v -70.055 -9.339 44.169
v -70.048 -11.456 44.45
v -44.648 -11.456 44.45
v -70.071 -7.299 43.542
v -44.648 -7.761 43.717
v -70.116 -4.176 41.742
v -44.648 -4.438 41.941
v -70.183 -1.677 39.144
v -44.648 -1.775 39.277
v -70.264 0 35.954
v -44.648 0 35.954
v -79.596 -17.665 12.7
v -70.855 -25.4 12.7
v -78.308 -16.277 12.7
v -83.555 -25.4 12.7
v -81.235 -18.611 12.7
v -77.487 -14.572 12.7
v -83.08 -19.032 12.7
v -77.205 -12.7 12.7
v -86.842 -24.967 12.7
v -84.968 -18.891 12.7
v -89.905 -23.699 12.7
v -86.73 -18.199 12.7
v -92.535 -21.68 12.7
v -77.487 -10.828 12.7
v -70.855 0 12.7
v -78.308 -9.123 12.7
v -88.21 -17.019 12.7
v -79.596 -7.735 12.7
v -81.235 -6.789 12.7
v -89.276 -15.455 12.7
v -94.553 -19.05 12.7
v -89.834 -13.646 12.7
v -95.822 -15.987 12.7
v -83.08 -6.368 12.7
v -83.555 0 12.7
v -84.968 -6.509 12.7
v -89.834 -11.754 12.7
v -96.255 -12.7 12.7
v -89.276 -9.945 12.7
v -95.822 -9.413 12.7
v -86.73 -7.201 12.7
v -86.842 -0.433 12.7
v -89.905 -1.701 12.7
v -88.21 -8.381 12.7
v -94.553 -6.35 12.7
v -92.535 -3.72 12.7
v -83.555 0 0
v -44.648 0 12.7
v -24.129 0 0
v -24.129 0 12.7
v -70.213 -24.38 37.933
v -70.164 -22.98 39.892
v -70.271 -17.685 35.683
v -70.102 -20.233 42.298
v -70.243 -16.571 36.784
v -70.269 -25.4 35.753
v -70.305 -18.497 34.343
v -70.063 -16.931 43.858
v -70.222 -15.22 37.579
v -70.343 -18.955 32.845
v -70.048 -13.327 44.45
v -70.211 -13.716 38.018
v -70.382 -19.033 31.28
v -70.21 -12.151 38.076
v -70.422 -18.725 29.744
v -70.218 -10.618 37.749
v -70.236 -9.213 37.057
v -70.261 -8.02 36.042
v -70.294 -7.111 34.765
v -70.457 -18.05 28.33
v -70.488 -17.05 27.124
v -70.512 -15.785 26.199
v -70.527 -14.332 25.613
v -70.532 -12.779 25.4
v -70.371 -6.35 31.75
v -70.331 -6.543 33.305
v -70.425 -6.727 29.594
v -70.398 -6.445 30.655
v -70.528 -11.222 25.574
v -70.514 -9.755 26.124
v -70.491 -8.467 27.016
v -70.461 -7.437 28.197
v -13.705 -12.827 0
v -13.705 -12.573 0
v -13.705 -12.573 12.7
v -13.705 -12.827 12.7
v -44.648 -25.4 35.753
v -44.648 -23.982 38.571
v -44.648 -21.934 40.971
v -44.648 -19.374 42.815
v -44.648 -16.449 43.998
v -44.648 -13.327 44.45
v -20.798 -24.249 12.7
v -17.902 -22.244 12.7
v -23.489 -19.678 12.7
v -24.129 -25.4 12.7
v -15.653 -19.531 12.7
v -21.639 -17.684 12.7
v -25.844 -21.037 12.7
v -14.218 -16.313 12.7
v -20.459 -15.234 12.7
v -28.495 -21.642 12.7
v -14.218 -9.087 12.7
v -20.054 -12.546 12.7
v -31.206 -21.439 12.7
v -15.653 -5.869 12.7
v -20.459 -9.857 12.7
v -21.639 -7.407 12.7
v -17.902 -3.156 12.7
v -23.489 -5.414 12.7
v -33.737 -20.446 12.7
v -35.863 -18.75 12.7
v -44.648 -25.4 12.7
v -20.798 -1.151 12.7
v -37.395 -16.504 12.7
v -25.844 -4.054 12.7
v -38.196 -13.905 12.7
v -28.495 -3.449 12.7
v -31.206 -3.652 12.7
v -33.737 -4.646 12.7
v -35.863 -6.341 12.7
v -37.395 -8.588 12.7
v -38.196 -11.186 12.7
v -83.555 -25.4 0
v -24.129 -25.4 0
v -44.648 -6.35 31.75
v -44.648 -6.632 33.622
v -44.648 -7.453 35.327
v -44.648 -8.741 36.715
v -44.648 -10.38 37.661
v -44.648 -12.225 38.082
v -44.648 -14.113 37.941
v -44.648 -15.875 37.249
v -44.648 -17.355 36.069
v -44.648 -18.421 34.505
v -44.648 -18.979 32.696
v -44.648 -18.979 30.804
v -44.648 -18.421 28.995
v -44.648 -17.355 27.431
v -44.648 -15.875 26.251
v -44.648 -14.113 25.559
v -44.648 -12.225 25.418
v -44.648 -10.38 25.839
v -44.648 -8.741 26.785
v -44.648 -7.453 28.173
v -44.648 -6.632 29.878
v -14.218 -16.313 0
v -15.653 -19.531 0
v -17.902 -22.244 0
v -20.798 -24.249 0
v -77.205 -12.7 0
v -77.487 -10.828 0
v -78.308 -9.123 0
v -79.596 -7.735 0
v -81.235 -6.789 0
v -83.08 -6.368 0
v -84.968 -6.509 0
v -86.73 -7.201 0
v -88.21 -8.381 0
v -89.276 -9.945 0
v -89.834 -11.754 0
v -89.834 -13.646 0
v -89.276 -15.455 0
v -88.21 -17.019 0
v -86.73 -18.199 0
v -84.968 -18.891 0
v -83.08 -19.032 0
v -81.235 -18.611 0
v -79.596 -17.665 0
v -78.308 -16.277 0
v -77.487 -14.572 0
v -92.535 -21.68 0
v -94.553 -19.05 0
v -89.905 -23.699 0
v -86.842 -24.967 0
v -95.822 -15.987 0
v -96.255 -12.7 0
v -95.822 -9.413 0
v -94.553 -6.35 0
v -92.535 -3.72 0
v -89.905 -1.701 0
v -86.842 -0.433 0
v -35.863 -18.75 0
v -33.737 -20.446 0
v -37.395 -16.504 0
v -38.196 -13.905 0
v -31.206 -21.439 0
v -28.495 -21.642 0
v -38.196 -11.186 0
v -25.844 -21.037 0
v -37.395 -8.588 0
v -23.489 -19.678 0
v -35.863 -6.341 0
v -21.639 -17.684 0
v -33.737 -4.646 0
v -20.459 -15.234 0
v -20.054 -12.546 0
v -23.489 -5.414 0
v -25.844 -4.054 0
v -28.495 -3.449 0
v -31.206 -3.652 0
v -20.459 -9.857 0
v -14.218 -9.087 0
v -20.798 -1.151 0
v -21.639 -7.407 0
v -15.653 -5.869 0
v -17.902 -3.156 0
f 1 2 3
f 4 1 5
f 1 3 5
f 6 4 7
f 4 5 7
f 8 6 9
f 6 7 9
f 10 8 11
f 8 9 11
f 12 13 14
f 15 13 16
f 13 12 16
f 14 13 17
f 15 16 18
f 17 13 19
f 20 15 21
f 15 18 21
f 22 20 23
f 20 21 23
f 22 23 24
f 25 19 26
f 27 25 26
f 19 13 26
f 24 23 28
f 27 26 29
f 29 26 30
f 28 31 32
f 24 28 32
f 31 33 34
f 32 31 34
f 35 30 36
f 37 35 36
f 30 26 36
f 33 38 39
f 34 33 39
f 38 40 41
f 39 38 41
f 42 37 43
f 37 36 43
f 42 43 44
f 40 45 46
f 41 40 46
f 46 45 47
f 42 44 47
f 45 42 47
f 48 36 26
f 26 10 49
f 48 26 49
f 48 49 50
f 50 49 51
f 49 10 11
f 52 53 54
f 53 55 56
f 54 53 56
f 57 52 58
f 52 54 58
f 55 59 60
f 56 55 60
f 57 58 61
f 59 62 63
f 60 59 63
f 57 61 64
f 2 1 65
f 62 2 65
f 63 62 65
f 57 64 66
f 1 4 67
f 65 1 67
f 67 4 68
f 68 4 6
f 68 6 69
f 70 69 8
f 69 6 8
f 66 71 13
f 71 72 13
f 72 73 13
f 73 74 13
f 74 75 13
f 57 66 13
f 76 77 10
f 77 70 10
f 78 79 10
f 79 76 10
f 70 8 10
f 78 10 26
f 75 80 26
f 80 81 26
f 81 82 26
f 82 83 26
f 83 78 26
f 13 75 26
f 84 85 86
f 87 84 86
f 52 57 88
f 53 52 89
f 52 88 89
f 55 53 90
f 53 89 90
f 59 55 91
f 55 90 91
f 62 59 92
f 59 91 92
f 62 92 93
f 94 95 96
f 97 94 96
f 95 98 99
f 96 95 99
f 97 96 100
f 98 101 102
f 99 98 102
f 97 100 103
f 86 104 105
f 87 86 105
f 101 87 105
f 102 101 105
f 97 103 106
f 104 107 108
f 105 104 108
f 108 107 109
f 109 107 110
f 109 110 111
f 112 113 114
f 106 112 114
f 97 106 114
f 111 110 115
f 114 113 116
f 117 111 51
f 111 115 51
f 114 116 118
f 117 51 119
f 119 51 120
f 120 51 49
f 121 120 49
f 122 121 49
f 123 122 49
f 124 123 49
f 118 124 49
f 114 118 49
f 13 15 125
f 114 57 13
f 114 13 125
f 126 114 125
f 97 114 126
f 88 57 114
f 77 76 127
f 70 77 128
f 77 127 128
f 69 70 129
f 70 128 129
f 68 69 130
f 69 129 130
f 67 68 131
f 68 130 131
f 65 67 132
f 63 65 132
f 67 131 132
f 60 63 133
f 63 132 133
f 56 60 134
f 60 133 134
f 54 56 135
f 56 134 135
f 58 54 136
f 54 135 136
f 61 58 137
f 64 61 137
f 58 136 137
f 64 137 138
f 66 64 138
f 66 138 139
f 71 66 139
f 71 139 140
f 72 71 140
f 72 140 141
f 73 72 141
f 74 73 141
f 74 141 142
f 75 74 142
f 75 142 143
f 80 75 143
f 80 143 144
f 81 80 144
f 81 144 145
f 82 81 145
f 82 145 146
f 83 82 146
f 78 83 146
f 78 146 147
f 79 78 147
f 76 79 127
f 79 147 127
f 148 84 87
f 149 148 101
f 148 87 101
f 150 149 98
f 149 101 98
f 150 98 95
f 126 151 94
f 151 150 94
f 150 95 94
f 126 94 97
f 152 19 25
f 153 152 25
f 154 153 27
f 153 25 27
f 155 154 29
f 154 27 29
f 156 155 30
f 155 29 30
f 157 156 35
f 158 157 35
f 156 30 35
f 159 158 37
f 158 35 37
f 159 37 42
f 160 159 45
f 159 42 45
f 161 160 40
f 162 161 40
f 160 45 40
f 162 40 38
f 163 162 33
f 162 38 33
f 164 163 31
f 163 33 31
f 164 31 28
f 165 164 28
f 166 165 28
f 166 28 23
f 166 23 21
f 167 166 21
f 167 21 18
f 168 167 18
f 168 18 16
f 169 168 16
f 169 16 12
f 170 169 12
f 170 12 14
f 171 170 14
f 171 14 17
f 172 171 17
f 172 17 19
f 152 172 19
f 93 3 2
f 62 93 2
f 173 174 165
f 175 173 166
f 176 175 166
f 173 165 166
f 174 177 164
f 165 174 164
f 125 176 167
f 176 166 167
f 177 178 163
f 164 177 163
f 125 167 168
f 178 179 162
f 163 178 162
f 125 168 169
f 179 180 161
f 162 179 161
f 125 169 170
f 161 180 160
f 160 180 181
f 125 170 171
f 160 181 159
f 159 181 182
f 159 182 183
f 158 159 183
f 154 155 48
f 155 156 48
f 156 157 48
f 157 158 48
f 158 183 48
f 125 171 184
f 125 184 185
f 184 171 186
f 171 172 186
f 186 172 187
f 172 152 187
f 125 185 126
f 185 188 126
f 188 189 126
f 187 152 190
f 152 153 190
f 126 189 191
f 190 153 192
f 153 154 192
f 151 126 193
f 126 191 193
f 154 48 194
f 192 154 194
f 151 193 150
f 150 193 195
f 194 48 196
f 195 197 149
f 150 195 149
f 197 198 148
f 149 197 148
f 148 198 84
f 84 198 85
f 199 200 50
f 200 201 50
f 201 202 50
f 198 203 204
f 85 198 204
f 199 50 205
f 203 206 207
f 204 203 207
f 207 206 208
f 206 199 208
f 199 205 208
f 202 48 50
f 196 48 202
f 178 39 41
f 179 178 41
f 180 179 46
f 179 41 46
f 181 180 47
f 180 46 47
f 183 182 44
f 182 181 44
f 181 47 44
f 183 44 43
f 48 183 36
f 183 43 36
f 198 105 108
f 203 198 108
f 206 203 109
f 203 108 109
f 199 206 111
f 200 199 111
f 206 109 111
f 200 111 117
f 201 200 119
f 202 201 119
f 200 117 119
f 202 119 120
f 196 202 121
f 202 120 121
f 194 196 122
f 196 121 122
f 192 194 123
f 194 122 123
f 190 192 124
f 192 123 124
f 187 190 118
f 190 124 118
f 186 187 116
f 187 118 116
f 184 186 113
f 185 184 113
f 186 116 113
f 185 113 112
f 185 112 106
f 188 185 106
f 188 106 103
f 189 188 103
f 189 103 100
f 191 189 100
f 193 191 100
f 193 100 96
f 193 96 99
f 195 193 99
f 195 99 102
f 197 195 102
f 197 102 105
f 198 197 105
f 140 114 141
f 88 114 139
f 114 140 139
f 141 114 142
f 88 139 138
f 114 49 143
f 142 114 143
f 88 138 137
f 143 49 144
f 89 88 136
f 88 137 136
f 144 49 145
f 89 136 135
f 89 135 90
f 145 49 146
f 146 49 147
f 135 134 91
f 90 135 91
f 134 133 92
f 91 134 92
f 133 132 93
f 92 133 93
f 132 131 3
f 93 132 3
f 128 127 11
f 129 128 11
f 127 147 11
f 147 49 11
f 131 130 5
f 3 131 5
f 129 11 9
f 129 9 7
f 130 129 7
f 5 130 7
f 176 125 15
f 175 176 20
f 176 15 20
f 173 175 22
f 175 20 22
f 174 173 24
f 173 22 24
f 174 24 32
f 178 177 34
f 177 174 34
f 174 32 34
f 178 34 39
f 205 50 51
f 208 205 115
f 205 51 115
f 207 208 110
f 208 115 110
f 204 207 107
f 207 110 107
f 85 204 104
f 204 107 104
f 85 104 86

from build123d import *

# Parameters (mm, degrees)
F1_DEPTH  = 25.4
F2_R      = 6.35
F3_DEPTH  = 51.60825547
F5_DEPTH  = 51.60825547
F6_R      = 9.122141835
F7_DEPTH  = 12.701
F8_R      = 6.35
F9_DEPTH  = 12.701
F11_DEPTH = 12.701
F13_DEPTH = 12.701


with BuildPart() as f1:
    # F0 (on Front) → F1 (new body)
    with BuildSketch(Plane.XZ):
        Polygon((-70.854865197, 12.7), (-96.254865197, 12.7), (-96.254865197, 0), (-13.704865197, 0), (-13.704865197, 12.7), (-44.647609727, 12.7), (-44.647609727, 44.45), (-70.047609727, 44.45), align=None)
    extrude(amount=F1_DEPTH)

    # F2 (on face) → F3 (cut, through all)
    with BuildSketch(Plane.YZ.offset(-44.647609727)):
        with Locations((-12.7, 31.75)):
            Circle(F2_R)
    extrude(amount=-F3_DEPTH, mode=Mode.SUBTRACT)

    # F4 (on face) → F5 (cut, through all)
    with BuildSketch(Plane.YZ.offset(-44.647609727)):
        with BuildLine():
            ThreePointArc((-25.4, 35.7528030872), (-20.7098485948, 41.9702258596), (-13.3271264447, 44.45))
            Line((-13.3271264447, 44.45), (-25.4, 44.45))
            Line((-25.4, 44.45), (-25.4, 35.7528030872))
        make_face()
        with BuildLine():
            Line((0, 44.45), (-11.4556124951, 44.45))
            ThreePointArc((-11.4556124951, 44.45), (-4.4379972961, 41.9413380989), (0, 35.9543114901))
            Line((0, 35.9543114901), (0, 44.45))
        make_face()
    extrude(amount=-F5_DEPTH, mode=Mode.SUBTRACT)

    # F6 (on face) → F7 (cut, through all)
    with BuildSketch(Plane.XY.offset(12.7)):
        with Locations((-29.176237462, -12.5456847349)):
            Circle(F6_R)
    extrude(amount=-F7_DEPTH, mode=Mode.SUBTRACT)

    # F8 (on face) → F9 (cut, through all)
    with BuildSketch(Plane.XY.offset(12.7)):
        with Locations((-83.554865197, -12.7)):
            Circle(F8_R)
    extrude(amount=-F9_DEPTH, mode=Mode.SUBTRACT)

    # F10 (on face) → F11 (cut, through all)
    with BuildSketch(Plane.XY.offset(12.7)):
        with BuildLine():
            ThreePointArc((-96.254865197, -12.7), (-92.5351213181, -3.7197438789), (-83.554865197, 0))
            Line((-83.554865197, 0), (-96.254865197, 0))
            Line((-96.254865197, 0), (-96.254865197, -12.7))
        make_face()
        with BuildLine():
            ThreePointArc((-83.554865197, -25.4), (-92.5351213181, -21.6802561211), (-96.254865197, -12.7))
            Line((-96.254865197, -12.7), (-96.254865197, -25.4))
            Line((-96.254865197, -25.4), (-83.554865197, -25.4))
        make_face()
    extrude(amount=-F11_DEPTH, mode=Mode.SUBTRACT)

    # F12 (on face) → F13 (cut, through all)
    with BuildSketch(Plane.XY.offset(12.7)):
        with BuildLine():
            ThreePointArc((-24.1288895467, 0), (-16.6844564555, -4.4358743894), (-13.704865197, -12.5733556693))
            Line((-13.704865197, -12.5733556693), (-13.704865197, 0))
            Line((-13.704865197, 0), (-24.1288895467, 0))
        make_face()
        with BuildLine():
            ThreePointArc((-13.704865197, -12.8266443307), (-16.6844564555, -20.9641256106), (-24.1288895467, -25.4))
            Line((-24.1288895467, -25.4), (-13.704865197, -25.4))
            Line((-13.704865197, -25.4), (-13.704865197, -12.8266443307))
        make_face()
    extrude(amount=-F13_DEPTH, mode=Mode.SUBTRACT)


solid = f1.part
